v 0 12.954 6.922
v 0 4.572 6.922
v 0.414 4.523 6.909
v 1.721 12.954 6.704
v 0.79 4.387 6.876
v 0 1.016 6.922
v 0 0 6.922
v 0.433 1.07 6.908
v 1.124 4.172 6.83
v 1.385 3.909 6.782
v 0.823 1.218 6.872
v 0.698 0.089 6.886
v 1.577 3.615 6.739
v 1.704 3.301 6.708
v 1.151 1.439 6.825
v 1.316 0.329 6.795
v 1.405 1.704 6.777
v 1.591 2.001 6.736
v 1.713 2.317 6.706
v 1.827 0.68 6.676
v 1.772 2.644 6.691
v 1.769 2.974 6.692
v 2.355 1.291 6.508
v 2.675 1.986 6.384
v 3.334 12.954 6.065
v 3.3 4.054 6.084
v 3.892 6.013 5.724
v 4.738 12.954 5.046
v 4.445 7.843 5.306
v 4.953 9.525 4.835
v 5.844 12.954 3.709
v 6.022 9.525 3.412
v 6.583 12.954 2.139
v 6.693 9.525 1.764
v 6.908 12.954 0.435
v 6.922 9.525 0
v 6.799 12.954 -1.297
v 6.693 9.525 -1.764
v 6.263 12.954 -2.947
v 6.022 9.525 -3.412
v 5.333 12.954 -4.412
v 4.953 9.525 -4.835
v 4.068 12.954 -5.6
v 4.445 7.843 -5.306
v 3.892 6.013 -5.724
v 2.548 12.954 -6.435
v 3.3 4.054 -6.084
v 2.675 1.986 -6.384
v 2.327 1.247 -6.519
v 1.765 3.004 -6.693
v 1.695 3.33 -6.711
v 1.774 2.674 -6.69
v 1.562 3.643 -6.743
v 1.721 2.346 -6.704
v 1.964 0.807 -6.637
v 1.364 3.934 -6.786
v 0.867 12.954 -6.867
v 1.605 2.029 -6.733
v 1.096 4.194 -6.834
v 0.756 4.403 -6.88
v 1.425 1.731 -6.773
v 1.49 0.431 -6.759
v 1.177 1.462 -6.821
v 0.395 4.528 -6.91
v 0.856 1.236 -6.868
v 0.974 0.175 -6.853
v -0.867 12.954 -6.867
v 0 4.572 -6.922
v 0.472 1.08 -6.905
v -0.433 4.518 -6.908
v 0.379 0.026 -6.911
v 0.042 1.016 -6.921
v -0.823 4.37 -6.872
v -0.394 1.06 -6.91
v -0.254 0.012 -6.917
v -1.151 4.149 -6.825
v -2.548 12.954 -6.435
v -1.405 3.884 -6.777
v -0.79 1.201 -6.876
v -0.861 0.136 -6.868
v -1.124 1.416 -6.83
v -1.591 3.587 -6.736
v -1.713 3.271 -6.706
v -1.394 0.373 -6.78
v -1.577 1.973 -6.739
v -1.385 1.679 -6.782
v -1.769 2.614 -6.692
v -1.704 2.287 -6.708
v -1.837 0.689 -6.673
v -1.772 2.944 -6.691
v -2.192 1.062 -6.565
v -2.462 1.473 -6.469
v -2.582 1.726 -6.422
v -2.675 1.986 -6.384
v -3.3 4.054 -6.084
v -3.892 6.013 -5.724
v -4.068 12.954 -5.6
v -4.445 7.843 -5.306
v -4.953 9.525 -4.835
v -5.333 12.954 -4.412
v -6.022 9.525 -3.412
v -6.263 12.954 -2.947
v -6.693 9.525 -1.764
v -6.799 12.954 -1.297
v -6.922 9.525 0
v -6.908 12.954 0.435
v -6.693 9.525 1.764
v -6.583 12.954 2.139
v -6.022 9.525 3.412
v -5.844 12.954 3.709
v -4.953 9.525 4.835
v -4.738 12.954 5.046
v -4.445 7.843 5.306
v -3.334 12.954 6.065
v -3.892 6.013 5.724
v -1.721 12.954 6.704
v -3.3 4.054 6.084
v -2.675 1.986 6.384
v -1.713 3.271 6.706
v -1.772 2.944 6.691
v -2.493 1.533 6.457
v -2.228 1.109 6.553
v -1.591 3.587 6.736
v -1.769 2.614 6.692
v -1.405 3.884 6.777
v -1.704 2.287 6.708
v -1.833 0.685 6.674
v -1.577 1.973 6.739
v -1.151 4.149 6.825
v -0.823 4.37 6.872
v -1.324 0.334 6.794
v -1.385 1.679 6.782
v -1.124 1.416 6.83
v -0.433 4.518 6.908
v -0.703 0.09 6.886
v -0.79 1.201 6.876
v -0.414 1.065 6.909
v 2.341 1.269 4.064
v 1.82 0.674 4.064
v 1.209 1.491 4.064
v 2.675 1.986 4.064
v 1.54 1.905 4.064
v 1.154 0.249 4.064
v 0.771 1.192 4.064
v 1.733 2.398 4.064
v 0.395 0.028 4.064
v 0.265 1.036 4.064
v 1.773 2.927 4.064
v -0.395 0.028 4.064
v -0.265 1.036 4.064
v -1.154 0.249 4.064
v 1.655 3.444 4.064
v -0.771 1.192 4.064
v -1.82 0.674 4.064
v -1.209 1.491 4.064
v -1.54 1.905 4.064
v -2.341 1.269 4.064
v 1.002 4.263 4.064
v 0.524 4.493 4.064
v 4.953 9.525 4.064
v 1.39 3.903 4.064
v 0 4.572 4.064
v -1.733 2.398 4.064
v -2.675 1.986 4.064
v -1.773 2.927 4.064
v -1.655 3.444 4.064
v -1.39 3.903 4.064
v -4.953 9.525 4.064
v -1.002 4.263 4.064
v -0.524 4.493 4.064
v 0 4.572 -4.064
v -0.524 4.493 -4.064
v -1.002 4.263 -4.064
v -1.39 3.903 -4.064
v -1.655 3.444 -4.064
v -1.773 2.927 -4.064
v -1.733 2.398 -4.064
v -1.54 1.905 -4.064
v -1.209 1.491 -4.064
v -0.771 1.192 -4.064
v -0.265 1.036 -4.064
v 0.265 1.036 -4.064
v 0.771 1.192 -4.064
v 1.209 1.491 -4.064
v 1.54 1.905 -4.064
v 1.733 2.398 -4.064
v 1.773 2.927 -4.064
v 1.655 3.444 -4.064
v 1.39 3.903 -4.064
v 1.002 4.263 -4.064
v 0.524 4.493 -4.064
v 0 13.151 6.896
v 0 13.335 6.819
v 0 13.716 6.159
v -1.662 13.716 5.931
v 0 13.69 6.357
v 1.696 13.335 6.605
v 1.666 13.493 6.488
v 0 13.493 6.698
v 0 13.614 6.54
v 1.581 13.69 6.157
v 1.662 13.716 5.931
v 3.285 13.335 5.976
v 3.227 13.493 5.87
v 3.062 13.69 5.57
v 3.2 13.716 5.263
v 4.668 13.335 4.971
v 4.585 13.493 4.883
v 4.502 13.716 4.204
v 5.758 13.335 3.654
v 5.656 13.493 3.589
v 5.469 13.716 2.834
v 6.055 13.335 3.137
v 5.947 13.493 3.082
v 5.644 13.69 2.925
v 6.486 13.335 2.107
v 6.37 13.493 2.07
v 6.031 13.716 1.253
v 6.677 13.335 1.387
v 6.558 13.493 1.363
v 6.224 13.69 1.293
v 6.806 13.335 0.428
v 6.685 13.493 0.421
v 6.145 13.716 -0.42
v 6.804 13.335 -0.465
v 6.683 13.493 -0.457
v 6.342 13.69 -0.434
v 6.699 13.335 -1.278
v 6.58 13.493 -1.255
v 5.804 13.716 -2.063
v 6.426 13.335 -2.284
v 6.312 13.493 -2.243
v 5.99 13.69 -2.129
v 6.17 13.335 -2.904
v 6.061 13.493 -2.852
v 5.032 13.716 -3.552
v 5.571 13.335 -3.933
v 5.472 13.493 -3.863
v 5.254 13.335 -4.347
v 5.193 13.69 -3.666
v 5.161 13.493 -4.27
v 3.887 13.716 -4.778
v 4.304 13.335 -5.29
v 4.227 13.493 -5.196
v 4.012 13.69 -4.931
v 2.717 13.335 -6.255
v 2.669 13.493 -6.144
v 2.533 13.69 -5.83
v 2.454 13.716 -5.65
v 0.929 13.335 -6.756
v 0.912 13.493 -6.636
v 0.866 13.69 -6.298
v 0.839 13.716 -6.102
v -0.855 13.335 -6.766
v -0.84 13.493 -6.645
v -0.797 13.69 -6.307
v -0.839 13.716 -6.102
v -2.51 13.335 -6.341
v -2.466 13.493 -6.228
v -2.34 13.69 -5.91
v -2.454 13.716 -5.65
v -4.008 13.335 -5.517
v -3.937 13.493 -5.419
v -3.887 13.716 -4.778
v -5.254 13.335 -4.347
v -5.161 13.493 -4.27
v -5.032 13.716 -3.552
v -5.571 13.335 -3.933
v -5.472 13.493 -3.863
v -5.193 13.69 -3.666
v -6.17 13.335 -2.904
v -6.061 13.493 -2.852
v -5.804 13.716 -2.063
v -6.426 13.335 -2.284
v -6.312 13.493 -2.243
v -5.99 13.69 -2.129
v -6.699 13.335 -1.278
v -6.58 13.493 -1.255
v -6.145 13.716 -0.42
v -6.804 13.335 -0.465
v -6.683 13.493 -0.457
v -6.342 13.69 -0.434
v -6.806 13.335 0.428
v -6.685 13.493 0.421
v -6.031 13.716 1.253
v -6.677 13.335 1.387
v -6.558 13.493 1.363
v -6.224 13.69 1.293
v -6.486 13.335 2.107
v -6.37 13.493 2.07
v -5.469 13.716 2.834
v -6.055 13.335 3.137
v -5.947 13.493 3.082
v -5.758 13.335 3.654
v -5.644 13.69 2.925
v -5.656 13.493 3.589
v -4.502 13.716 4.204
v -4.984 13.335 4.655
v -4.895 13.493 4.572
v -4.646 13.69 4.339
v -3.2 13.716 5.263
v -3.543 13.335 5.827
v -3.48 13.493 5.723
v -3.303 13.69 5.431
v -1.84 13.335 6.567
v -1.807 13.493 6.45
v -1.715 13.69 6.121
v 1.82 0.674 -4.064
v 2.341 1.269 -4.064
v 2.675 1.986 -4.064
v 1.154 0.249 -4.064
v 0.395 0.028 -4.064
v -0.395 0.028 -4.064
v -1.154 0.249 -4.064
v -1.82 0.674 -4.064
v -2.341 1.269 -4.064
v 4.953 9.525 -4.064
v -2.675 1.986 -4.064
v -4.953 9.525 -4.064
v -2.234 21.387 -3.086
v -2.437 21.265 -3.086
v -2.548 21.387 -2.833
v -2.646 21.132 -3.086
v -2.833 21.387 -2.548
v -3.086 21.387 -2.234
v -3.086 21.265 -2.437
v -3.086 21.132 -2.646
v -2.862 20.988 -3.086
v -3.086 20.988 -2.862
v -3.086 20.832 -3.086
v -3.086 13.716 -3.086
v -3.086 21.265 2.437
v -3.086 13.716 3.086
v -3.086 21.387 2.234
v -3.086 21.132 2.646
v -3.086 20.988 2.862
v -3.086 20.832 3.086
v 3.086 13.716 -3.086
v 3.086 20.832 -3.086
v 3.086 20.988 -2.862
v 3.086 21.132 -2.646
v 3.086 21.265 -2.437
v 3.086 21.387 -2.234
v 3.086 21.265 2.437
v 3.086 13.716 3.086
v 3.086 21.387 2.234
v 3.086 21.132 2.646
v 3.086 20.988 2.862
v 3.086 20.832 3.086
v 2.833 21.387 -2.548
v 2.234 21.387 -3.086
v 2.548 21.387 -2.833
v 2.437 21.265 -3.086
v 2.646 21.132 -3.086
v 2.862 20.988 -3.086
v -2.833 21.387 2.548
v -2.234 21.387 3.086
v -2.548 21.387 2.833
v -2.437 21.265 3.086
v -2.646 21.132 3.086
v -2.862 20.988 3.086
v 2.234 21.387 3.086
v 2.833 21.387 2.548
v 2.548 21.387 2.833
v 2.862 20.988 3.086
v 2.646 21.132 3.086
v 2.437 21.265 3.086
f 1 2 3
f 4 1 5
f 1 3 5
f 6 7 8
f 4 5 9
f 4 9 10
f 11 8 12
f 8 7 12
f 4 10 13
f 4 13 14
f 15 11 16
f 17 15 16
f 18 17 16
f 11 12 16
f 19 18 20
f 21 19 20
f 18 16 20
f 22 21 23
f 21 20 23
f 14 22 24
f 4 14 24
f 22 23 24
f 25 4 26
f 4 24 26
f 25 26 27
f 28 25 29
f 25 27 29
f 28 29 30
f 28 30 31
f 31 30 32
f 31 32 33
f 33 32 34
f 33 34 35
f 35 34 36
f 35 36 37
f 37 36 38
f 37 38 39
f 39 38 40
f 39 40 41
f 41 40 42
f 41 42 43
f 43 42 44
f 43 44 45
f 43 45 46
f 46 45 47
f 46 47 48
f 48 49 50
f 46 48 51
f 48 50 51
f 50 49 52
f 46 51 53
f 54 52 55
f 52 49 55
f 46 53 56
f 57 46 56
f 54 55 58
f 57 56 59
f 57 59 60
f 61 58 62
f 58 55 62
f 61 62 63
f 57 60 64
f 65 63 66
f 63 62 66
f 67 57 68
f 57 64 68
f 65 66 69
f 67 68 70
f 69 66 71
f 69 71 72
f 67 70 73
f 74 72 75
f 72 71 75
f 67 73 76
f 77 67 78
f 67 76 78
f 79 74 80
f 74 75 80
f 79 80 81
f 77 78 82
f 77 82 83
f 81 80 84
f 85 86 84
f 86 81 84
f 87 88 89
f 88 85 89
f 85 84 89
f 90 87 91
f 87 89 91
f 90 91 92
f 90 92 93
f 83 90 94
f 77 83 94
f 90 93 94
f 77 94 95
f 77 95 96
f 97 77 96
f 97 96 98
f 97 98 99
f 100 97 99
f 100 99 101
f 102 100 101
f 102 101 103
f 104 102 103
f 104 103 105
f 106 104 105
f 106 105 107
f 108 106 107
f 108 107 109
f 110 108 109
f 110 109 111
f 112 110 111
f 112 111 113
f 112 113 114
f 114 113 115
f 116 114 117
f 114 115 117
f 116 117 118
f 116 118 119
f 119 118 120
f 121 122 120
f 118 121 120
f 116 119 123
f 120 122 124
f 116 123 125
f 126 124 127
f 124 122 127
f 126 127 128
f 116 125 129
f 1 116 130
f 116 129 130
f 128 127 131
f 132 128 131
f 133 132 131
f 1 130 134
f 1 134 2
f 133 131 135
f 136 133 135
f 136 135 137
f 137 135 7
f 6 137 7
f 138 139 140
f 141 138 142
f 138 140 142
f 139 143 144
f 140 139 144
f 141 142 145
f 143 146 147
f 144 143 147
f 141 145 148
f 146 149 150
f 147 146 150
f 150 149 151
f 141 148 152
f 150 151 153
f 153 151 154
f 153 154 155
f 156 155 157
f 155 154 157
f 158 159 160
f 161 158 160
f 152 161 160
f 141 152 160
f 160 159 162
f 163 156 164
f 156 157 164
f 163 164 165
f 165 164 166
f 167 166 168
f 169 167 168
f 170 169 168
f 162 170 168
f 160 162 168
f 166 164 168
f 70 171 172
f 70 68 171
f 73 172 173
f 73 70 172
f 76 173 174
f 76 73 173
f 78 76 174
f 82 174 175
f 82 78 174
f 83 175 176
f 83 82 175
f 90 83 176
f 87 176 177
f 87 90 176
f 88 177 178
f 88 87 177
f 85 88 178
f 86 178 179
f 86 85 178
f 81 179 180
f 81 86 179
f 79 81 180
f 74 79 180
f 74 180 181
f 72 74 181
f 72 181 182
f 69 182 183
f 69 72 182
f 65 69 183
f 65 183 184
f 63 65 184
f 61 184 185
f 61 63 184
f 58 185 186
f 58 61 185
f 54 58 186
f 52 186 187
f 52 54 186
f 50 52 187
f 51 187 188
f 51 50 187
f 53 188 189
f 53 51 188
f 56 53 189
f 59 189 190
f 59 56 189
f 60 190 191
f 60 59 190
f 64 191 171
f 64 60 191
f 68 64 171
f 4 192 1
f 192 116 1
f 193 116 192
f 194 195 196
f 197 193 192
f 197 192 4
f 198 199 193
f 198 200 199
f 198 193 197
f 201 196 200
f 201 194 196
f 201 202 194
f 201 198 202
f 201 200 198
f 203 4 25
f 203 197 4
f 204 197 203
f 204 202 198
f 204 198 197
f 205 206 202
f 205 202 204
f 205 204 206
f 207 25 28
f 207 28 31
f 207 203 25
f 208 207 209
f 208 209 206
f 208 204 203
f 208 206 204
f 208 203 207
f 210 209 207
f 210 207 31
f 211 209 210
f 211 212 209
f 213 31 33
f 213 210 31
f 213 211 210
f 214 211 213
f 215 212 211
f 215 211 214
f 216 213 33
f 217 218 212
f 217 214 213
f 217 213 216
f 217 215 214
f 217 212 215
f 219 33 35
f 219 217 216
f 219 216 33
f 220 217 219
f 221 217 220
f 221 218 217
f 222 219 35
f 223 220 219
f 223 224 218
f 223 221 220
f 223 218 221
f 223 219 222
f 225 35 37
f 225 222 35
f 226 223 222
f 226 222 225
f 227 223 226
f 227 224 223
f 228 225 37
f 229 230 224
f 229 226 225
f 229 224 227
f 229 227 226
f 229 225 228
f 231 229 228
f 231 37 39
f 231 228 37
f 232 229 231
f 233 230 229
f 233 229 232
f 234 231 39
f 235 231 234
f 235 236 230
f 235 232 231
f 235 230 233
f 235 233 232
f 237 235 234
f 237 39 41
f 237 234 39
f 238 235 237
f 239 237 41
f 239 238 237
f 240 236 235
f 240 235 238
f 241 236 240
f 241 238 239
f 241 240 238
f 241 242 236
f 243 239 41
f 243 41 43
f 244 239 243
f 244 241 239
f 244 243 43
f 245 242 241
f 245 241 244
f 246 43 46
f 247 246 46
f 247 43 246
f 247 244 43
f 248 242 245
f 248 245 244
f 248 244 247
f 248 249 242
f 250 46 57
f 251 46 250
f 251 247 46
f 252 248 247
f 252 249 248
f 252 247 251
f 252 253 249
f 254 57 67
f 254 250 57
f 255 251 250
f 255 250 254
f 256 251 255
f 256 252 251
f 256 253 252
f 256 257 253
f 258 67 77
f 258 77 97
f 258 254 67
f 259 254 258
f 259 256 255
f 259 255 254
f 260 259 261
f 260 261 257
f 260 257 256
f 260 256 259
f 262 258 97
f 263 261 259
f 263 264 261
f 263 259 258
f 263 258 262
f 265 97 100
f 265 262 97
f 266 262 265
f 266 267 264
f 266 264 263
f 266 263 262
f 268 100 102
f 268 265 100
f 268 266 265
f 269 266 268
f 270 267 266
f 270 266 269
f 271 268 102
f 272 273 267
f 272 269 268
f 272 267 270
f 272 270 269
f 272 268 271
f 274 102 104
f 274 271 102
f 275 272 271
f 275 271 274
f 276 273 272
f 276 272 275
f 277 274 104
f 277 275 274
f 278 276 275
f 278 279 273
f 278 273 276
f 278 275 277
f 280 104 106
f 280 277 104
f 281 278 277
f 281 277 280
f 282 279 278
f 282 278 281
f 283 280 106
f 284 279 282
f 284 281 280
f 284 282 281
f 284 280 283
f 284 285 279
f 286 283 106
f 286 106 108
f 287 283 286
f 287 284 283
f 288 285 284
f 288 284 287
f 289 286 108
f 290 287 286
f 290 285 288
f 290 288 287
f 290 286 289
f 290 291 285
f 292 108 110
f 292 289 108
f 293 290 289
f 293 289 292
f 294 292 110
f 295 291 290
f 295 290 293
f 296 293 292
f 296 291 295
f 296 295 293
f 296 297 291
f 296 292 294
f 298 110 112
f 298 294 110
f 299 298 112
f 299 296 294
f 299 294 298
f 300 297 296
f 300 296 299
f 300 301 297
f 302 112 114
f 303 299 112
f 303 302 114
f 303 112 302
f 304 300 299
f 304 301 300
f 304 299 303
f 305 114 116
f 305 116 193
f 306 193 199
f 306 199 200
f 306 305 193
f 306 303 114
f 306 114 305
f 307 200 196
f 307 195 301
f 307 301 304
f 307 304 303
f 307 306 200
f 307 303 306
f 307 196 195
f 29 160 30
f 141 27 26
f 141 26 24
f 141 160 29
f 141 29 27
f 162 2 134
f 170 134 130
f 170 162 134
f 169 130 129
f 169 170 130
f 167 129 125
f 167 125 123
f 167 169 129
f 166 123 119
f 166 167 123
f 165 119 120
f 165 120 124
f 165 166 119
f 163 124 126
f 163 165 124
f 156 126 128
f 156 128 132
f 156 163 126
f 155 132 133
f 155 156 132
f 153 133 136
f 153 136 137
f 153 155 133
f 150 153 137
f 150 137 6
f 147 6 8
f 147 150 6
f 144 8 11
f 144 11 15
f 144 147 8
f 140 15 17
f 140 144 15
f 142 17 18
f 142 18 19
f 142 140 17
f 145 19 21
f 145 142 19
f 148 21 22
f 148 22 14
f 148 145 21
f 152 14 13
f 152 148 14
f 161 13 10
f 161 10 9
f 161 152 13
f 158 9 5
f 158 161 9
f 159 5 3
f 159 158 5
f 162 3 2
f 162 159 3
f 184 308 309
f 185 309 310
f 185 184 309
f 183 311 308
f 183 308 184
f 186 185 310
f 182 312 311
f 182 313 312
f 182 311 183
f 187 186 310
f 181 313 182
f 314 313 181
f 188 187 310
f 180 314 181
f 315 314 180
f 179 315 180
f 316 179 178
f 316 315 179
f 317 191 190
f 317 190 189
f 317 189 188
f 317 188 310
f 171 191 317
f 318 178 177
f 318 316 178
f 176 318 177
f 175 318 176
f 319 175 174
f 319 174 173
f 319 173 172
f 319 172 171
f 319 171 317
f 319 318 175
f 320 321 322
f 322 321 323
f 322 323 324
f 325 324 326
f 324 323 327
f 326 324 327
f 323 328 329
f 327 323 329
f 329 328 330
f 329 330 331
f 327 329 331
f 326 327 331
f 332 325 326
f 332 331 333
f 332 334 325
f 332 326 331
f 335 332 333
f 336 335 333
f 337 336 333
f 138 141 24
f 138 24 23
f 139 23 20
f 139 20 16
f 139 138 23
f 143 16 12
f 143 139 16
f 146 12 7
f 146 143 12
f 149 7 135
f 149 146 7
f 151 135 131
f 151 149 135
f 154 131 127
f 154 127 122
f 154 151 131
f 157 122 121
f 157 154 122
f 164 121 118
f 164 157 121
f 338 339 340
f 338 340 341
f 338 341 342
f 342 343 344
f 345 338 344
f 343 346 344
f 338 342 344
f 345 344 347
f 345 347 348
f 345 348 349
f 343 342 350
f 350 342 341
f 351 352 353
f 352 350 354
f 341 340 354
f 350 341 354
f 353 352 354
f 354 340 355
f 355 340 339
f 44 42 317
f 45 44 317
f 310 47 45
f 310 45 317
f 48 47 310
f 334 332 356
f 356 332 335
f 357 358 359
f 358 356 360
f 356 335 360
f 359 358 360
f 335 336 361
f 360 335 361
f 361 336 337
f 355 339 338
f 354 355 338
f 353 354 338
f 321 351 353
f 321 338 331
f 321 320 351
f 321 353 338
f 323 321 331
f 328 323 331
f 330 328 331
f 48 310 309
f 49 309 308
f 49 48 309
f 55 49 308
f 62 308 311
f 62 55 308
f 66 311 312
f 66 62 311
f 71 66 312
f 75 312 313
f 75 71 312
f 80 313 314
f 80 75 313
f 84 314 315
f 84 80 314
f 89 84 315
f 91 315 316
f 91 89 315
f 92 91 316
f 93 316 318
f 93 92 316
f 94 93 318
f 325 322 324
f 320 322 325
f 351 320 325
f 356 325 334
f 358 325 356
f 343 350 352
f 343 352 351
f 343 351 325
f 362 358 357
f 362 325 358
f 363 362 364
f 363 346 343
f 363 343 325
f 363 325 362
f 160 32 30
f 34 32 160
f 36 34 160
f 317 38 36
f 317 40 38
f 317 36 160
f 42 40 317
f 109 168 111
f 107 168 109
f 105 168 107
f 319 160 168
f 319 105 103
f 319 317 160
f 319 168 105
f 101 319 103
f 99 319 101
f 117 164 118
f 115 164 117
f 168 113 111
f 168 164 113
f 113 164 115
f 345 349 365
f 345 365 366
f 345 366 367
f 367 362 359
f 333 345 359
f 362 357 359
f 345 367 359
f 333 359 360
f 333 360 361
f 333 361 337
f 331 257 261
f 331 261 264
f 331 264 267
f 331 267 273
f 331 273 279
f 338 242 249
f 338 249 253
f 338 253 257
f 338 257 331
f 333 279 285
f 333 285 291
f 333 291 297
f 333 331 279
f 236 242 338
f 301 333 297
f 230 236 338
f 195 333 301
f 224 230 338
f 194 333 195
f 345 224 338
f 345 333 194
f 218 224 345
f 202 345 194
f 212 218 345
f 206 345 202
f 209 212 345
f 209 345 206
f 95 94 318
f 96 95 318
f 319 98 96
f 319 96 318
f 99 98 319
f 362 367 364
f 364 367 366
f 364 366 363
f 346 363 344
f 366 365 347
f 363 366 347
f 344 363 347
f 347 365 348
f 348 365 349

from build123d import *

# Parameters (mm, degrees)
BASE_R                  = 6.9215
BASE_EXTRUDE_DEPTH      = 13.716
MALEDRIVE_R             = 6.0579
DRIVE_EXTRUDE_DEPTH     = 7.6708
SQDRIVE_SK_OUTSIDE_W    = 21.642
SQDRIVE_SK_OUTSIDE_H    = 21.642
SQDRIVE_SK_OUTSIDE_W_2  = 6.1722
SQDRIVE_SK_OUTSIDE_H_2  = 6.1722
DRIVE_SQCUT_DEPTH       = 7.6708
BASE_FILLET_TOP_R       = 0.762
PROFILE1_CUT_DEPTH      = 24.520406857
PROFILE1_CUT_DEPTH_BACK = 24.520406857
PROFILE1_CUTSK_W        = 8.128
PROFILE1_CUTSK_H        = 9.525
PROFILE2_CUT_DEPTH      = 24.520406857
PROFILE2_CUT_DEPTH_BACK = 24.520406857
PIN_CUT_DEPTH           = 24.520406916
PIN_CUT_DEPTH_BACK      = 24.520406916
PIN_CUTSK_R             = 1.778


with BuildPart() as part:
    # Base → Base-Extrude (new body)
    with BuildSketch(Plane(origin=(0, 0, 0), x_dir=(1, 0, 0), z_dir=(0, 1, 0))):
        with Locations(Location((0, 0, 0), (0, 0, 270))):
            Circle(BASE_R)
    extrude(amount=BASE_EXTRUDE_DEPTH)

    # MaleDrive → Drive-Extrude (add)
    with BuildSketch(Plane(origin=(0, 13.716, 0), x_dir=(1, 0, 0), z_dir=(0, 1, 0))):
        with Locations(Location((0, 0, 0), (0, 0, 270))):
            Circle(MALEDRIVE_R)
    extrude(amount=DRIVE_EXTRUDE_DEPTH)

    # Drive-ChamCut → DriveEnd-Chamfer (revolve, cut)
    with BuildSketch(Plane.XY, mode=Mode.PRIVATE) as driveend_chamfer_sk:
        Polygon((-3.81, 21.3868), (-5.4229, 19.7739), (-5.4229, 21.3868), align=None)
    revolve(driveend_chamfer_sk.sketch.rotate(Axis((0, 0, 0), (0, 1, 0)), 270), axis=Axis((0, 0, 0), (0, 1, 0)), mode=Mode.SUBTRACT)

    # SQDrive-Sk outside → Drive-SQCut (cut)
    with BuildSketch(Plane(origin=(0, 21.3868, 0), x_dir=(-1, 0, 0), z_dir=(0, 1, 0))):
        Rectangle(SQDRIVE_SK_OUTSIDE_W, SQDRIVE_SK_OUTSIDE_H)
        Rectangle(SQDRIVE_SK_OUTSIDE_W_2, SQDRIVE_SK_OUTSIDE_H_2, mode=Mode.SUBTRACT)
    extrude(amount=-DRIVE_SQCUT_DEPTH, mode=Mode.SUBTRACT)

    # Base-Fillet_Top
    base_fillet_top_edges = [part.edges().sort_by_distance(p)[0] for p in [
        (0, 13.716, -6.9215),
    ]]
    fillet(base_fillet_top_edges, radius=BASE_FILLET_TOP_R)

    # Profile1-CutSk → Profile1-Cut (cut, two sides: drawn at the far end of the back side and taken through both)
    with BuildSketch(Plane(origin=(0, 0, 0), x_dir=(0, 0, -1), z_dir=(1, 0, 0)).offset(-PROFILE1_CUT_DEPTH_BACK)):
        with Locations((0, 4.7625)):
            Rectangle(PROFILE1_CUTSK_W, PROFILE1_CUTSK_H)
    extrude(amount=PROFILE1_CUT_DEPTH + PROFILE1_CUT_DEPTH_BACK, mode=Mode.SUBTRACT)

    # Profile2-CutSk → Profile2-Cut (cut, two sides: drawn at the far end of the back side and taken through both)
    with BuildSketch(Plane.XY.offset(-PROFILE2_CUT_DEPTH_BACK)):
        with BuildLine():
            Line((53.381392937, 9.525), (6.9215, 9.525))
            Line((6.9215, 9.525), (4.953, 9.525))
            Line((4.953, 9.525), (2.674532127, 1.985721643))
            ThreePointArc((2.674532127, 1.985721643), (0, 0), (-2.674532127, 1.985721643))
            Line((-2.674532127, 1.985721643), (-4.953, 9.525))
            Line((-4.953, 9.525), (-6.9215, 9.525))
            Line((-6.9215, 9.525), (-53.381392937, 9.525))
            Line((-53.381392937, 9.525), (-53.381392937, -83.394785874))
            Line((-53.381392937, -83.394785874), (53.381392937, -83.394785874))
            Line((53.381392937, -83.394785874), (53.381392937, 9.525))
        make_face()
    extrude(amount=PROFILE2_CUT_DEPTH + PROFILE2_CUT_DEPTH_BACK, mode=Mode.SUBTRACT)

    # Pin-CutSk → Pin-Cut (cut, two sides: drawn at the far end of the back side and taken through both)
    with BuildSketch(Plane.XY.offset(-PIN_CUT_DEPTH_BACK)):
        with Locations(Location((0, 2.794, 0), (0, 0, 90))):
            Circle(PIN_CUTSK_R)
    extrude(amount=PIN_CUT_DEPTH + PIN_CUT_DEPTH_BACK, mode=Mode.SUBTRACT)


solid = part.part
